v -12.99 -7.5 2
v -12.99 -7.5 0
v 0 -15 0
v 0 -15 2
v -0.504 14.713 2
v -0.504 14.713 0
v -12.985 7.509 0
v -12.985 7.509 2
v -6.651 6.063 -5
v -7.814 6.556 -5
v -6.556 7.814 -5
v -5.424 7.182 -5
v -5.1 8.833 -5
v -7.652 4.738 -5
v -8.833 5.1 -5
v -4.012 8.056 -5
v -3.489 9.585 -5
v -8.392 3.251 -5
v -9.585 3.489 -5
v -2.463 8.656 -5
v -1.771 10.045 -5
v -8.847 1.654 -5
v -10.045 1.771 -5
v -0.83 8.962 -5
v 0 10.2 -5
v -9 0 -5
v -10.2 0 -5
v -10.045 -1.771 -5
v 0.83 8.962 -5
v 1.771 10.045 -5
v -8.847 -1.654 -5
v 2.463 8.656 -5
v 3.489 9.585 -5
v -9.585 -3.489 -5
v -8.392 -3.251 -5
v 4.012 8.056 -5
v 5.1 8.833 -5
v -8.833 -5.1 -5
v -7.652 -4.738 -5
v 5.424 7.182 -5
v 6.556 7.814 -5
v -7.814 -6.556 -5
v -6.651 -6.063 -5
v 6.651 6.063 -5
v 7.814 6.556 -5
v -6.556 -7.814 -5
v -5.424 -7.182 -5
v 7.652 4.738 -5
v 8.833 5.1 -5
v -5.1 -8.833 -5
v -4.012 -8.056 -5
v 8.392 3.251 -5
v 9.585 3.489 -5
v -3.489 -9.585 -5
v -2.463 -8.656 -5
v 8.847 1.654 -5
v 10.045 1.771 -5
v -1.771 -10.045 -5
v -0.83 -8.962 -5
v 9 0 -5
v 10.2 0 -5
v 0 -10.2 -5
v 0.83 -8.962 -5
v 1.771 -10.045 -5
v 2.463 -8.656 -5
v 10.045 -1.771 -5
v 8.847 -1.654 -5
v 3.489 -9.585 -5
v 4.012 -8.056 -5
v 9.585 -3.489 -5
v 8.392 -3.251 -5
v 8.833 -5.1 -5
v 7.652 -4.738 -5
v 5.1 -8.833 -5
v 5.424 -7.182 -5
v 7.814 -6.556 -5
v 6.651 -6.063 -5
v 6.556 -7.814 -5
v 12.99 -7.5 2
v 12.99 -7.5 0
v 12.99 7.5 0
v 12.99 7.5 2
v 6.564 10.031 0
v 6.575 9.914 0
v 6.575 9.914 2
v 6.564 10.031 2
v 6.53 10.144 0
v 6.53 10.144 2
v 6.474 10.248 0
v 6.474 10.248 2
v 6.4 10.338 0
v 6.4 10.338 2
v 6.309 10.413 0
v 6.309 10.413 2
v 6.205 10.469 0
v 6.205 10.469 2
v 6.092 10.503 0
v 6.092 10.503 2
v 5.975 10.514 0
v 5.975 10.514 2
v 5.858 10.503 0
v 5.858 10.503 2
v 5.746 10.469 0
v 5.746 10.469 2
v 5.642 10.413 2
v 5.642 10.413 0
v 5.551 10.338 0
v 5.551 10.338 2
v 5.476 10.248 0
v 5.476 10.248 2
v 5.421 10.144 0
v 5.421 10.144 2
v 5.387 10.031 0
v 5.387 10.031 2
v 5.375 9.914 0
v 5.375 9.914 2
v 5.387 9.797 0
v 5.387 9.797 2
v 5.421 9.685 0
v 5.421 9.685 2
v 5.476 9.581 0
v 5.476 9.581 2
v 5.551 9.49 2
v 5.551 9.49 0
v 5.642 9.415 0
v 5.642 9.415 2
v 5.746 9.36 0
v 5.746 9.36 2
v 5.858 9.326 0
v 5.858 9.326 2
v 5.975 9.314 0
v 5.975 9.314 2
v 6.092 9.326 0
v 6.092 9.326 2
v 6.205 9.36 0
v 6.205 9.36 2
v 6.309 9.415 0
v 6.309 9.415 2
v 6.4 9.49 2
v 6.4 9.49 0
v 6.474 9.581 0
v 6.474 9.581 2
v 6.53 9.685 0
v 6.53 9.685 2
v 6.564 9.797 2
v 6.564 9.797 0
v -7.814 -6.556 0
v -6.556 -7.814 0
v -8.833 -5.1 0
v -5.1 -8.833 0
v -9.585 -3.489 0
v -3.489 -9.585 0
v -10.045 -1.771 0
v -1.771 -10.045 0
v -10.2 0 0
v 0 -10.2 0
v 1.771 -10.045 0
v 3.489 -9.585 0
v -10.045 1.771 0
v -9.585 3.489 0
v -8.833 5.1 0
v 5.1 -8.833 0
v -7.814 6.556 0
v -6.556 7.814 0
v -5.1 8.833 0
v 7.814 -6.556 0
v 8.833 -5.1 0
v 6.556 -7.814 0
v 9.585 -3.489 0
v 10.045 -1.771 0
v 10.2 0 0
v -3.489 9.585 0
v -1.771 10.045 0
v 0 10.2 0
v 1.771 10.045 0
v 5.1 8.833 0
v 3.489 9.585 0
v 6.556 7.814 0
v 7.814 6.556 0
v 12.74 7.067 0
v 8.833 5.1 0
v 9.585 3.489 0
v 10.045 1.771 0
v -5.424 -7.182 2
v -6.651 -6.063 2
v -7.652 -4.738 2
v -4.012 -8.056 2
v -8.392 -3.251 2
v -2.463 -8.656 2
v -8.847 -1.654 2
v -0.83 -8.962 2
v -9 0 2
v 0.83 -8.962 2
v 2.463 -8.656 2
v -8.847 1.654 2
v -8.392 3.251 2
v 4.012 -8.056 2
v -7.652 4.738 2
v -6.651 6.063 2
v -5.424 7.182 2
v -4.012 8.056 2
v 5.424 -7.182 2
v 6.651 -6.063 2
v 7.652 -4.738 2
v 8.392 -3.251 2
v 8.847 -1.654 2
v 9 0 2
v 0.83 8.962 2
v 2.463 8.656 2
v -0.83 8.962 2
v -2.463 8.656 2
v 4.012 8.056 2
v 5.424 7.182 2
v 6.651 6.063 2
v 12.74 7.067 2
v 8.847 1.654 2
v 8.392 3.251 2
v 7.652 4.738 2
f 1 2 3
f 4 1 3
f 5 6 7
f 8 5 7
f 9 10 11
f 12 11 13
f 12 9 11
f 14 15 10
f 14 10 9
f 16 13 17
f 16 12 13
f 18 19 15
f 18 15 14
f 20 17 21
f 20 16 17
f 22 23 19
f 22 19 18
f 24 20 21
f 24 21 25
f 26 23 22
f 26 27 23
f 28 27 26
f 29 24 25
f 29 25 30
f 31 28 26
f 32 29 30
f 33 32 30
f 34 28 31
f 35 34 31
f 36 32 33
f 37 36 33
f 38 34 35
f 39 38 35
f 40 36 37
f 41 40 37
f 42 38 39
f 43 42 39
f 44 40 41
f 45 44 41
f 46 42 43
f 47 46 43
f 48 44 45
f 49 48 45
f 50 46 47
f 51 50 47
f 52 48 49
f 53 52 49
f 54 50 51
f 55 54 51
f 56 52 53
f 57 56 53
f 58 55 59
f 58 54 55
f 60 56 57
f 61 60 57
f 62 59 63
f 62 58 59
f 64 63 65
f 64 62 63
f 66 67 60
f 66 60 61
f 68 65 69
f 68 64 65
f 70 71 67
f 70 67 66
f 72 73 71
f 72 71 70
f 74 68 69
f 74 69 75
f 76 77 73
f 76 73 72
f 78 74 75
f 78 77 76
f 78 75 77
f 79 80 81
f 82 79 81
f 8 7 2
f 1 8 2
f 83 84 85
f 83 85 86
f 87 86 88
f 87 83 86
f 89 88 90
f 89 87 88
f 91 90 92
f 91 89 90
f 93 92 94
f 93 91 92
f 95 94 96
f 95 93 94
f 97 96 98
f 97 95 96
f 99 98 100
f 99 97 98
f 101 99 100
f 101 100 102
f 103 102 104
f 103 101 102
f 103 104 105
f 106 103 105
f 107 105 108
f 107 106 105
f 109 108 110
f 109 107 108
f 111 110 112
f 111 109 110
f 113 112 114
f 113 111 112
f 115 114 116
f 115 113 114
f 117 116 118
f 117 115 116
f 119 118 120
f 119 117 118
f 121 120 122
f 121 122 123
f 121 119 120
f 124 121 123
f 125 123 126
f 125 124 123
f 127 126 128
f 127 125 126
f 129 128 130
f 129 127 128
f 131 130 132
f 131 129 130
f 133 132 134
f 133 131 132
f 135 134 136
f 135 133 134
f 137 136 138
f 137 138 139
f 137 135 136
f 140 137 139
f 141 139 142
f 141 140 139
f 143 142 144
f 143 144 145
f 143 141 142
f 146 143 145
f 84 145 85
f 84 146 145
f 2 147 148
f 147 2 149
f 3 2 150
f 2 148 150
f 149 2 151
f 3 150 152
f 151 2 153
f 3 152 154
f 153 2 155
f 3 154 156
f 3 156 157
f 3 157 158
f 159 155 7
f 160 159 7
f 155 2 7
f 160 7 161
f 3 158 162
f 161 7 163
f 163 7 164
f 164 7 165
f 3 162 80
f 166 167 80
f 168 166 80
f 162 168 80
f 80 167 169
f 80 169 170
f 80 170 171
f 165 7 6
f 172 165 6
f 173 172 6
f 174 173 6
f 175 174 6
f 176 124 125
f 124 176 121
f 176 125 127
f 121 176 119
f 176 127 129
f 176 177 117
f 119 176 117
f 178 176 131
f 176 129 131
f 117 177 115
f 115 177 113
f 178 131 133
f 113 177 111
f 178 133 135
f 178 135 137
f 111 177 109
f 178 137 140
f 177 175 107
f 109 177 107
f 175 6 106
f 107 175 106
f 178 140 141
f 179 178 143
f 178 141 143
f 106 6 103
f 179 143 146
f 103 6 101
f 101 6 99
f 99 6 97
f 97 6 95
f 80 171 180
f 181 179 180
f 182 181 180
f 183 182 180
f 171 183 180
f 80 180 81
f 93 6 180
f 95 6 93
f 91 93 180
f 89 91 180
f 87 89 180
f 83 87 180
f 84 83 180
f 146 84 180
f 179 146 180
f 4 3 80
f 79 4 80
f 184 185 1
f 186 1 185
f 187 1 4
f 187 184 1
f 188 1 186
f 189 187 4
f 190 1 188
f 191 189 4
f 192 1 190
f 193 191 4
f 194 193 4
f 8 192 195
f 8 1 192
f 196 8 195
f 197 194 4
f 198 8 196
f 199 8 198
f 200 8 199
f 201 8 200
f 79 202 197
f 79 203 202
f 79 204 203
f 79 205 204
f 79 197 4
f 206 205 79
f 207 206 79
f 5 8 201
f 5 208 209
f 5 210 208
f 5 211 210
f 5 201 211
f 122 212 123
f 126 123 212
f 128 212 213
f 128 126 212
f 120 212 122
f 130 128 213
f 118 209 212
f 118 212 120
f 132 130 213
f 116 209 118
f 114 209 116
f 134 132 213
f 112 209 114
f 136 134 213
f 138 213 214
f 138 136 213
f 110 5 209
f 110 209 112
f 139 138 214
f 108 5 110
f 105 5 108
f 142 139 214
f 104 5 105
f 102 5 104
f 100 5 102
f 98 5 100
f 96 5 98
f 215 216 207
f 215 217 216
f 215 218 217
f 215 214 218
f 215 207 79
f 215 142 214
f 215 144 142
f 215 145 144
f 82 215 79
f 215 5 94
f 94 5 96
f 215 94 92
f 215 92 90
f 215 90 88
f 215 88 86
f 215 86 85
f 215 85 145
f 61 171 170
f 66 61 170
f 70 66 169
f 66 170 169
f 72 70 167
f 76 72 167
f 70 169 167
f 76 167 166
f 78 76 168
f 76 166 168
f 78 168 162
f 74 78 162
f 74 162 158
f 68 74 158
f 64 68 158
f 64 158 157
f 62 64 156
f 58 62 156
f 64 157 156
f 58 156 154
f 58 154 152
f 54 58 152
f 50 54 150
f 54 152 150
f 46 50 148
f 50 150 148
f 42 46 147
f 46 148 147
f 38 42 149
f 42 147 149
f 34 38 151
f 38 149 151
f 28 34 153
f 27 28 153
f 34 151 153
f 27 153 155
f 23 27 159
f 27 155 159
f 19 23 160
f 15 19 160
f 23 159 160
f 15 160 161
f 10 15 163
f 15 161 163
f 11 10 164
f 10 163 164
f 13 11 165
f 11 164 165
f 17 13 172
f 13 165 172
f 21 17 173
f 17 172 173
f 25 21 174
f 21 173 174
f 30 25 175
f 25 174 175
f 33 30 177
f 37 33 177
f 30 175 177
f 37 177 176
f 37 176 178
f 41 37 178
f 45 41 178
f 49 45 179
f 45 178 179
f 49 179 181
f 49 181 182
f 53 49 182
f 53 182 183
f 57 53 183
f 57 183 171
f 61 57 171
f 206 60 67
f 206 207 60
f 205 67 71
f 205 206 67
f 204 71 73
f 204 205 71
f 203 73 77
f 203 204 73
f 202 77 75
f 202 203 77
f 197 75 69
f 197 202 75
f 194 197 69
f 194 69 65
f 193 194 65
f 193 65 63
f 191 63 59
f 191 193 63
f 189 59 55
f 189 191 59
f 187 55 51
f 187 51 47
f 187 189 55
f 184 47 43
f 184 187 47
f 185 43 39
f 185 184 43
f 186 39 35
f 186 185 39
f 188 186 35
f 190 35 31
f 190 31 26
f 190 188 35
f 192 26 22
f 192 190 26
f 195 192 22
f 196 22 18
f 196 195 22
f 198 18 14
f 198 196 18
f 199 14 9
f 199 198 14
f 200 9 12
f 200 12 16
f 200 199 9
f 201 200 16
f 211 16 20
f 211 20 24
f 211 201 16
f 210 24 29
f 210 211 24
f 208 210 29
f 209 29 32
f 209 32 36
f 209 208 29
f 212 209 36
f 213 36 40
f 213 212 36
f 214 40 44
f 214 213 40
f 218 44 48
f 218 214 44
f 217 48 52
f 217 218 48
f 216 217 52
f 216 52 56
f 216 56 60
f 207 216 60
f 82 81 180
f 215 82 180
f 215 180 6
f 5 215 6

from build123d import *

# Parameters (mm, degrees)
SKETCH_R      = 9
SKETCH_R_2    = 0.6
PAD_DEPTH     = 2
SKETCH001_R   = 10.2
SKETCH001_R_2 = 9
PAD001_DEPTH  = 5


with BuildPart() as part:
    # Sketch → Pad (new body)
    with BuildSketch(Plane.XY):
        Polygon((-0.50397, 14.713397), (-12.984903, 7.508821), (-12.99, -7.5), (0, -14.99967), (12.99, -7.5), (12.99, 7.5), (12.74, 7.066987), align=None)
        Circle(SKETCH_R, mode=Mode.SUBTRACT)
        with Locations((5.975274, 9.914229)):
            Circle(SKETCH_R_2, mode=Mode.SUBTRACT)
    extrude(amount=PAD_DEPTH)

    # Sketch001 (on Face10 of Pad) → Pad001 (join)
    with BuildSketch(Plane(origin=(0, 0, 0), x_dir=(1, 0, 0), z_dir=(0, 0, -1))):
        Circle(SKETCH001_R)
        Circle(SKETCH001_R_2, mode=Mode.SUBTRACT)
    extrude(amount=PAD001_DEPTH)


solid = part.part
